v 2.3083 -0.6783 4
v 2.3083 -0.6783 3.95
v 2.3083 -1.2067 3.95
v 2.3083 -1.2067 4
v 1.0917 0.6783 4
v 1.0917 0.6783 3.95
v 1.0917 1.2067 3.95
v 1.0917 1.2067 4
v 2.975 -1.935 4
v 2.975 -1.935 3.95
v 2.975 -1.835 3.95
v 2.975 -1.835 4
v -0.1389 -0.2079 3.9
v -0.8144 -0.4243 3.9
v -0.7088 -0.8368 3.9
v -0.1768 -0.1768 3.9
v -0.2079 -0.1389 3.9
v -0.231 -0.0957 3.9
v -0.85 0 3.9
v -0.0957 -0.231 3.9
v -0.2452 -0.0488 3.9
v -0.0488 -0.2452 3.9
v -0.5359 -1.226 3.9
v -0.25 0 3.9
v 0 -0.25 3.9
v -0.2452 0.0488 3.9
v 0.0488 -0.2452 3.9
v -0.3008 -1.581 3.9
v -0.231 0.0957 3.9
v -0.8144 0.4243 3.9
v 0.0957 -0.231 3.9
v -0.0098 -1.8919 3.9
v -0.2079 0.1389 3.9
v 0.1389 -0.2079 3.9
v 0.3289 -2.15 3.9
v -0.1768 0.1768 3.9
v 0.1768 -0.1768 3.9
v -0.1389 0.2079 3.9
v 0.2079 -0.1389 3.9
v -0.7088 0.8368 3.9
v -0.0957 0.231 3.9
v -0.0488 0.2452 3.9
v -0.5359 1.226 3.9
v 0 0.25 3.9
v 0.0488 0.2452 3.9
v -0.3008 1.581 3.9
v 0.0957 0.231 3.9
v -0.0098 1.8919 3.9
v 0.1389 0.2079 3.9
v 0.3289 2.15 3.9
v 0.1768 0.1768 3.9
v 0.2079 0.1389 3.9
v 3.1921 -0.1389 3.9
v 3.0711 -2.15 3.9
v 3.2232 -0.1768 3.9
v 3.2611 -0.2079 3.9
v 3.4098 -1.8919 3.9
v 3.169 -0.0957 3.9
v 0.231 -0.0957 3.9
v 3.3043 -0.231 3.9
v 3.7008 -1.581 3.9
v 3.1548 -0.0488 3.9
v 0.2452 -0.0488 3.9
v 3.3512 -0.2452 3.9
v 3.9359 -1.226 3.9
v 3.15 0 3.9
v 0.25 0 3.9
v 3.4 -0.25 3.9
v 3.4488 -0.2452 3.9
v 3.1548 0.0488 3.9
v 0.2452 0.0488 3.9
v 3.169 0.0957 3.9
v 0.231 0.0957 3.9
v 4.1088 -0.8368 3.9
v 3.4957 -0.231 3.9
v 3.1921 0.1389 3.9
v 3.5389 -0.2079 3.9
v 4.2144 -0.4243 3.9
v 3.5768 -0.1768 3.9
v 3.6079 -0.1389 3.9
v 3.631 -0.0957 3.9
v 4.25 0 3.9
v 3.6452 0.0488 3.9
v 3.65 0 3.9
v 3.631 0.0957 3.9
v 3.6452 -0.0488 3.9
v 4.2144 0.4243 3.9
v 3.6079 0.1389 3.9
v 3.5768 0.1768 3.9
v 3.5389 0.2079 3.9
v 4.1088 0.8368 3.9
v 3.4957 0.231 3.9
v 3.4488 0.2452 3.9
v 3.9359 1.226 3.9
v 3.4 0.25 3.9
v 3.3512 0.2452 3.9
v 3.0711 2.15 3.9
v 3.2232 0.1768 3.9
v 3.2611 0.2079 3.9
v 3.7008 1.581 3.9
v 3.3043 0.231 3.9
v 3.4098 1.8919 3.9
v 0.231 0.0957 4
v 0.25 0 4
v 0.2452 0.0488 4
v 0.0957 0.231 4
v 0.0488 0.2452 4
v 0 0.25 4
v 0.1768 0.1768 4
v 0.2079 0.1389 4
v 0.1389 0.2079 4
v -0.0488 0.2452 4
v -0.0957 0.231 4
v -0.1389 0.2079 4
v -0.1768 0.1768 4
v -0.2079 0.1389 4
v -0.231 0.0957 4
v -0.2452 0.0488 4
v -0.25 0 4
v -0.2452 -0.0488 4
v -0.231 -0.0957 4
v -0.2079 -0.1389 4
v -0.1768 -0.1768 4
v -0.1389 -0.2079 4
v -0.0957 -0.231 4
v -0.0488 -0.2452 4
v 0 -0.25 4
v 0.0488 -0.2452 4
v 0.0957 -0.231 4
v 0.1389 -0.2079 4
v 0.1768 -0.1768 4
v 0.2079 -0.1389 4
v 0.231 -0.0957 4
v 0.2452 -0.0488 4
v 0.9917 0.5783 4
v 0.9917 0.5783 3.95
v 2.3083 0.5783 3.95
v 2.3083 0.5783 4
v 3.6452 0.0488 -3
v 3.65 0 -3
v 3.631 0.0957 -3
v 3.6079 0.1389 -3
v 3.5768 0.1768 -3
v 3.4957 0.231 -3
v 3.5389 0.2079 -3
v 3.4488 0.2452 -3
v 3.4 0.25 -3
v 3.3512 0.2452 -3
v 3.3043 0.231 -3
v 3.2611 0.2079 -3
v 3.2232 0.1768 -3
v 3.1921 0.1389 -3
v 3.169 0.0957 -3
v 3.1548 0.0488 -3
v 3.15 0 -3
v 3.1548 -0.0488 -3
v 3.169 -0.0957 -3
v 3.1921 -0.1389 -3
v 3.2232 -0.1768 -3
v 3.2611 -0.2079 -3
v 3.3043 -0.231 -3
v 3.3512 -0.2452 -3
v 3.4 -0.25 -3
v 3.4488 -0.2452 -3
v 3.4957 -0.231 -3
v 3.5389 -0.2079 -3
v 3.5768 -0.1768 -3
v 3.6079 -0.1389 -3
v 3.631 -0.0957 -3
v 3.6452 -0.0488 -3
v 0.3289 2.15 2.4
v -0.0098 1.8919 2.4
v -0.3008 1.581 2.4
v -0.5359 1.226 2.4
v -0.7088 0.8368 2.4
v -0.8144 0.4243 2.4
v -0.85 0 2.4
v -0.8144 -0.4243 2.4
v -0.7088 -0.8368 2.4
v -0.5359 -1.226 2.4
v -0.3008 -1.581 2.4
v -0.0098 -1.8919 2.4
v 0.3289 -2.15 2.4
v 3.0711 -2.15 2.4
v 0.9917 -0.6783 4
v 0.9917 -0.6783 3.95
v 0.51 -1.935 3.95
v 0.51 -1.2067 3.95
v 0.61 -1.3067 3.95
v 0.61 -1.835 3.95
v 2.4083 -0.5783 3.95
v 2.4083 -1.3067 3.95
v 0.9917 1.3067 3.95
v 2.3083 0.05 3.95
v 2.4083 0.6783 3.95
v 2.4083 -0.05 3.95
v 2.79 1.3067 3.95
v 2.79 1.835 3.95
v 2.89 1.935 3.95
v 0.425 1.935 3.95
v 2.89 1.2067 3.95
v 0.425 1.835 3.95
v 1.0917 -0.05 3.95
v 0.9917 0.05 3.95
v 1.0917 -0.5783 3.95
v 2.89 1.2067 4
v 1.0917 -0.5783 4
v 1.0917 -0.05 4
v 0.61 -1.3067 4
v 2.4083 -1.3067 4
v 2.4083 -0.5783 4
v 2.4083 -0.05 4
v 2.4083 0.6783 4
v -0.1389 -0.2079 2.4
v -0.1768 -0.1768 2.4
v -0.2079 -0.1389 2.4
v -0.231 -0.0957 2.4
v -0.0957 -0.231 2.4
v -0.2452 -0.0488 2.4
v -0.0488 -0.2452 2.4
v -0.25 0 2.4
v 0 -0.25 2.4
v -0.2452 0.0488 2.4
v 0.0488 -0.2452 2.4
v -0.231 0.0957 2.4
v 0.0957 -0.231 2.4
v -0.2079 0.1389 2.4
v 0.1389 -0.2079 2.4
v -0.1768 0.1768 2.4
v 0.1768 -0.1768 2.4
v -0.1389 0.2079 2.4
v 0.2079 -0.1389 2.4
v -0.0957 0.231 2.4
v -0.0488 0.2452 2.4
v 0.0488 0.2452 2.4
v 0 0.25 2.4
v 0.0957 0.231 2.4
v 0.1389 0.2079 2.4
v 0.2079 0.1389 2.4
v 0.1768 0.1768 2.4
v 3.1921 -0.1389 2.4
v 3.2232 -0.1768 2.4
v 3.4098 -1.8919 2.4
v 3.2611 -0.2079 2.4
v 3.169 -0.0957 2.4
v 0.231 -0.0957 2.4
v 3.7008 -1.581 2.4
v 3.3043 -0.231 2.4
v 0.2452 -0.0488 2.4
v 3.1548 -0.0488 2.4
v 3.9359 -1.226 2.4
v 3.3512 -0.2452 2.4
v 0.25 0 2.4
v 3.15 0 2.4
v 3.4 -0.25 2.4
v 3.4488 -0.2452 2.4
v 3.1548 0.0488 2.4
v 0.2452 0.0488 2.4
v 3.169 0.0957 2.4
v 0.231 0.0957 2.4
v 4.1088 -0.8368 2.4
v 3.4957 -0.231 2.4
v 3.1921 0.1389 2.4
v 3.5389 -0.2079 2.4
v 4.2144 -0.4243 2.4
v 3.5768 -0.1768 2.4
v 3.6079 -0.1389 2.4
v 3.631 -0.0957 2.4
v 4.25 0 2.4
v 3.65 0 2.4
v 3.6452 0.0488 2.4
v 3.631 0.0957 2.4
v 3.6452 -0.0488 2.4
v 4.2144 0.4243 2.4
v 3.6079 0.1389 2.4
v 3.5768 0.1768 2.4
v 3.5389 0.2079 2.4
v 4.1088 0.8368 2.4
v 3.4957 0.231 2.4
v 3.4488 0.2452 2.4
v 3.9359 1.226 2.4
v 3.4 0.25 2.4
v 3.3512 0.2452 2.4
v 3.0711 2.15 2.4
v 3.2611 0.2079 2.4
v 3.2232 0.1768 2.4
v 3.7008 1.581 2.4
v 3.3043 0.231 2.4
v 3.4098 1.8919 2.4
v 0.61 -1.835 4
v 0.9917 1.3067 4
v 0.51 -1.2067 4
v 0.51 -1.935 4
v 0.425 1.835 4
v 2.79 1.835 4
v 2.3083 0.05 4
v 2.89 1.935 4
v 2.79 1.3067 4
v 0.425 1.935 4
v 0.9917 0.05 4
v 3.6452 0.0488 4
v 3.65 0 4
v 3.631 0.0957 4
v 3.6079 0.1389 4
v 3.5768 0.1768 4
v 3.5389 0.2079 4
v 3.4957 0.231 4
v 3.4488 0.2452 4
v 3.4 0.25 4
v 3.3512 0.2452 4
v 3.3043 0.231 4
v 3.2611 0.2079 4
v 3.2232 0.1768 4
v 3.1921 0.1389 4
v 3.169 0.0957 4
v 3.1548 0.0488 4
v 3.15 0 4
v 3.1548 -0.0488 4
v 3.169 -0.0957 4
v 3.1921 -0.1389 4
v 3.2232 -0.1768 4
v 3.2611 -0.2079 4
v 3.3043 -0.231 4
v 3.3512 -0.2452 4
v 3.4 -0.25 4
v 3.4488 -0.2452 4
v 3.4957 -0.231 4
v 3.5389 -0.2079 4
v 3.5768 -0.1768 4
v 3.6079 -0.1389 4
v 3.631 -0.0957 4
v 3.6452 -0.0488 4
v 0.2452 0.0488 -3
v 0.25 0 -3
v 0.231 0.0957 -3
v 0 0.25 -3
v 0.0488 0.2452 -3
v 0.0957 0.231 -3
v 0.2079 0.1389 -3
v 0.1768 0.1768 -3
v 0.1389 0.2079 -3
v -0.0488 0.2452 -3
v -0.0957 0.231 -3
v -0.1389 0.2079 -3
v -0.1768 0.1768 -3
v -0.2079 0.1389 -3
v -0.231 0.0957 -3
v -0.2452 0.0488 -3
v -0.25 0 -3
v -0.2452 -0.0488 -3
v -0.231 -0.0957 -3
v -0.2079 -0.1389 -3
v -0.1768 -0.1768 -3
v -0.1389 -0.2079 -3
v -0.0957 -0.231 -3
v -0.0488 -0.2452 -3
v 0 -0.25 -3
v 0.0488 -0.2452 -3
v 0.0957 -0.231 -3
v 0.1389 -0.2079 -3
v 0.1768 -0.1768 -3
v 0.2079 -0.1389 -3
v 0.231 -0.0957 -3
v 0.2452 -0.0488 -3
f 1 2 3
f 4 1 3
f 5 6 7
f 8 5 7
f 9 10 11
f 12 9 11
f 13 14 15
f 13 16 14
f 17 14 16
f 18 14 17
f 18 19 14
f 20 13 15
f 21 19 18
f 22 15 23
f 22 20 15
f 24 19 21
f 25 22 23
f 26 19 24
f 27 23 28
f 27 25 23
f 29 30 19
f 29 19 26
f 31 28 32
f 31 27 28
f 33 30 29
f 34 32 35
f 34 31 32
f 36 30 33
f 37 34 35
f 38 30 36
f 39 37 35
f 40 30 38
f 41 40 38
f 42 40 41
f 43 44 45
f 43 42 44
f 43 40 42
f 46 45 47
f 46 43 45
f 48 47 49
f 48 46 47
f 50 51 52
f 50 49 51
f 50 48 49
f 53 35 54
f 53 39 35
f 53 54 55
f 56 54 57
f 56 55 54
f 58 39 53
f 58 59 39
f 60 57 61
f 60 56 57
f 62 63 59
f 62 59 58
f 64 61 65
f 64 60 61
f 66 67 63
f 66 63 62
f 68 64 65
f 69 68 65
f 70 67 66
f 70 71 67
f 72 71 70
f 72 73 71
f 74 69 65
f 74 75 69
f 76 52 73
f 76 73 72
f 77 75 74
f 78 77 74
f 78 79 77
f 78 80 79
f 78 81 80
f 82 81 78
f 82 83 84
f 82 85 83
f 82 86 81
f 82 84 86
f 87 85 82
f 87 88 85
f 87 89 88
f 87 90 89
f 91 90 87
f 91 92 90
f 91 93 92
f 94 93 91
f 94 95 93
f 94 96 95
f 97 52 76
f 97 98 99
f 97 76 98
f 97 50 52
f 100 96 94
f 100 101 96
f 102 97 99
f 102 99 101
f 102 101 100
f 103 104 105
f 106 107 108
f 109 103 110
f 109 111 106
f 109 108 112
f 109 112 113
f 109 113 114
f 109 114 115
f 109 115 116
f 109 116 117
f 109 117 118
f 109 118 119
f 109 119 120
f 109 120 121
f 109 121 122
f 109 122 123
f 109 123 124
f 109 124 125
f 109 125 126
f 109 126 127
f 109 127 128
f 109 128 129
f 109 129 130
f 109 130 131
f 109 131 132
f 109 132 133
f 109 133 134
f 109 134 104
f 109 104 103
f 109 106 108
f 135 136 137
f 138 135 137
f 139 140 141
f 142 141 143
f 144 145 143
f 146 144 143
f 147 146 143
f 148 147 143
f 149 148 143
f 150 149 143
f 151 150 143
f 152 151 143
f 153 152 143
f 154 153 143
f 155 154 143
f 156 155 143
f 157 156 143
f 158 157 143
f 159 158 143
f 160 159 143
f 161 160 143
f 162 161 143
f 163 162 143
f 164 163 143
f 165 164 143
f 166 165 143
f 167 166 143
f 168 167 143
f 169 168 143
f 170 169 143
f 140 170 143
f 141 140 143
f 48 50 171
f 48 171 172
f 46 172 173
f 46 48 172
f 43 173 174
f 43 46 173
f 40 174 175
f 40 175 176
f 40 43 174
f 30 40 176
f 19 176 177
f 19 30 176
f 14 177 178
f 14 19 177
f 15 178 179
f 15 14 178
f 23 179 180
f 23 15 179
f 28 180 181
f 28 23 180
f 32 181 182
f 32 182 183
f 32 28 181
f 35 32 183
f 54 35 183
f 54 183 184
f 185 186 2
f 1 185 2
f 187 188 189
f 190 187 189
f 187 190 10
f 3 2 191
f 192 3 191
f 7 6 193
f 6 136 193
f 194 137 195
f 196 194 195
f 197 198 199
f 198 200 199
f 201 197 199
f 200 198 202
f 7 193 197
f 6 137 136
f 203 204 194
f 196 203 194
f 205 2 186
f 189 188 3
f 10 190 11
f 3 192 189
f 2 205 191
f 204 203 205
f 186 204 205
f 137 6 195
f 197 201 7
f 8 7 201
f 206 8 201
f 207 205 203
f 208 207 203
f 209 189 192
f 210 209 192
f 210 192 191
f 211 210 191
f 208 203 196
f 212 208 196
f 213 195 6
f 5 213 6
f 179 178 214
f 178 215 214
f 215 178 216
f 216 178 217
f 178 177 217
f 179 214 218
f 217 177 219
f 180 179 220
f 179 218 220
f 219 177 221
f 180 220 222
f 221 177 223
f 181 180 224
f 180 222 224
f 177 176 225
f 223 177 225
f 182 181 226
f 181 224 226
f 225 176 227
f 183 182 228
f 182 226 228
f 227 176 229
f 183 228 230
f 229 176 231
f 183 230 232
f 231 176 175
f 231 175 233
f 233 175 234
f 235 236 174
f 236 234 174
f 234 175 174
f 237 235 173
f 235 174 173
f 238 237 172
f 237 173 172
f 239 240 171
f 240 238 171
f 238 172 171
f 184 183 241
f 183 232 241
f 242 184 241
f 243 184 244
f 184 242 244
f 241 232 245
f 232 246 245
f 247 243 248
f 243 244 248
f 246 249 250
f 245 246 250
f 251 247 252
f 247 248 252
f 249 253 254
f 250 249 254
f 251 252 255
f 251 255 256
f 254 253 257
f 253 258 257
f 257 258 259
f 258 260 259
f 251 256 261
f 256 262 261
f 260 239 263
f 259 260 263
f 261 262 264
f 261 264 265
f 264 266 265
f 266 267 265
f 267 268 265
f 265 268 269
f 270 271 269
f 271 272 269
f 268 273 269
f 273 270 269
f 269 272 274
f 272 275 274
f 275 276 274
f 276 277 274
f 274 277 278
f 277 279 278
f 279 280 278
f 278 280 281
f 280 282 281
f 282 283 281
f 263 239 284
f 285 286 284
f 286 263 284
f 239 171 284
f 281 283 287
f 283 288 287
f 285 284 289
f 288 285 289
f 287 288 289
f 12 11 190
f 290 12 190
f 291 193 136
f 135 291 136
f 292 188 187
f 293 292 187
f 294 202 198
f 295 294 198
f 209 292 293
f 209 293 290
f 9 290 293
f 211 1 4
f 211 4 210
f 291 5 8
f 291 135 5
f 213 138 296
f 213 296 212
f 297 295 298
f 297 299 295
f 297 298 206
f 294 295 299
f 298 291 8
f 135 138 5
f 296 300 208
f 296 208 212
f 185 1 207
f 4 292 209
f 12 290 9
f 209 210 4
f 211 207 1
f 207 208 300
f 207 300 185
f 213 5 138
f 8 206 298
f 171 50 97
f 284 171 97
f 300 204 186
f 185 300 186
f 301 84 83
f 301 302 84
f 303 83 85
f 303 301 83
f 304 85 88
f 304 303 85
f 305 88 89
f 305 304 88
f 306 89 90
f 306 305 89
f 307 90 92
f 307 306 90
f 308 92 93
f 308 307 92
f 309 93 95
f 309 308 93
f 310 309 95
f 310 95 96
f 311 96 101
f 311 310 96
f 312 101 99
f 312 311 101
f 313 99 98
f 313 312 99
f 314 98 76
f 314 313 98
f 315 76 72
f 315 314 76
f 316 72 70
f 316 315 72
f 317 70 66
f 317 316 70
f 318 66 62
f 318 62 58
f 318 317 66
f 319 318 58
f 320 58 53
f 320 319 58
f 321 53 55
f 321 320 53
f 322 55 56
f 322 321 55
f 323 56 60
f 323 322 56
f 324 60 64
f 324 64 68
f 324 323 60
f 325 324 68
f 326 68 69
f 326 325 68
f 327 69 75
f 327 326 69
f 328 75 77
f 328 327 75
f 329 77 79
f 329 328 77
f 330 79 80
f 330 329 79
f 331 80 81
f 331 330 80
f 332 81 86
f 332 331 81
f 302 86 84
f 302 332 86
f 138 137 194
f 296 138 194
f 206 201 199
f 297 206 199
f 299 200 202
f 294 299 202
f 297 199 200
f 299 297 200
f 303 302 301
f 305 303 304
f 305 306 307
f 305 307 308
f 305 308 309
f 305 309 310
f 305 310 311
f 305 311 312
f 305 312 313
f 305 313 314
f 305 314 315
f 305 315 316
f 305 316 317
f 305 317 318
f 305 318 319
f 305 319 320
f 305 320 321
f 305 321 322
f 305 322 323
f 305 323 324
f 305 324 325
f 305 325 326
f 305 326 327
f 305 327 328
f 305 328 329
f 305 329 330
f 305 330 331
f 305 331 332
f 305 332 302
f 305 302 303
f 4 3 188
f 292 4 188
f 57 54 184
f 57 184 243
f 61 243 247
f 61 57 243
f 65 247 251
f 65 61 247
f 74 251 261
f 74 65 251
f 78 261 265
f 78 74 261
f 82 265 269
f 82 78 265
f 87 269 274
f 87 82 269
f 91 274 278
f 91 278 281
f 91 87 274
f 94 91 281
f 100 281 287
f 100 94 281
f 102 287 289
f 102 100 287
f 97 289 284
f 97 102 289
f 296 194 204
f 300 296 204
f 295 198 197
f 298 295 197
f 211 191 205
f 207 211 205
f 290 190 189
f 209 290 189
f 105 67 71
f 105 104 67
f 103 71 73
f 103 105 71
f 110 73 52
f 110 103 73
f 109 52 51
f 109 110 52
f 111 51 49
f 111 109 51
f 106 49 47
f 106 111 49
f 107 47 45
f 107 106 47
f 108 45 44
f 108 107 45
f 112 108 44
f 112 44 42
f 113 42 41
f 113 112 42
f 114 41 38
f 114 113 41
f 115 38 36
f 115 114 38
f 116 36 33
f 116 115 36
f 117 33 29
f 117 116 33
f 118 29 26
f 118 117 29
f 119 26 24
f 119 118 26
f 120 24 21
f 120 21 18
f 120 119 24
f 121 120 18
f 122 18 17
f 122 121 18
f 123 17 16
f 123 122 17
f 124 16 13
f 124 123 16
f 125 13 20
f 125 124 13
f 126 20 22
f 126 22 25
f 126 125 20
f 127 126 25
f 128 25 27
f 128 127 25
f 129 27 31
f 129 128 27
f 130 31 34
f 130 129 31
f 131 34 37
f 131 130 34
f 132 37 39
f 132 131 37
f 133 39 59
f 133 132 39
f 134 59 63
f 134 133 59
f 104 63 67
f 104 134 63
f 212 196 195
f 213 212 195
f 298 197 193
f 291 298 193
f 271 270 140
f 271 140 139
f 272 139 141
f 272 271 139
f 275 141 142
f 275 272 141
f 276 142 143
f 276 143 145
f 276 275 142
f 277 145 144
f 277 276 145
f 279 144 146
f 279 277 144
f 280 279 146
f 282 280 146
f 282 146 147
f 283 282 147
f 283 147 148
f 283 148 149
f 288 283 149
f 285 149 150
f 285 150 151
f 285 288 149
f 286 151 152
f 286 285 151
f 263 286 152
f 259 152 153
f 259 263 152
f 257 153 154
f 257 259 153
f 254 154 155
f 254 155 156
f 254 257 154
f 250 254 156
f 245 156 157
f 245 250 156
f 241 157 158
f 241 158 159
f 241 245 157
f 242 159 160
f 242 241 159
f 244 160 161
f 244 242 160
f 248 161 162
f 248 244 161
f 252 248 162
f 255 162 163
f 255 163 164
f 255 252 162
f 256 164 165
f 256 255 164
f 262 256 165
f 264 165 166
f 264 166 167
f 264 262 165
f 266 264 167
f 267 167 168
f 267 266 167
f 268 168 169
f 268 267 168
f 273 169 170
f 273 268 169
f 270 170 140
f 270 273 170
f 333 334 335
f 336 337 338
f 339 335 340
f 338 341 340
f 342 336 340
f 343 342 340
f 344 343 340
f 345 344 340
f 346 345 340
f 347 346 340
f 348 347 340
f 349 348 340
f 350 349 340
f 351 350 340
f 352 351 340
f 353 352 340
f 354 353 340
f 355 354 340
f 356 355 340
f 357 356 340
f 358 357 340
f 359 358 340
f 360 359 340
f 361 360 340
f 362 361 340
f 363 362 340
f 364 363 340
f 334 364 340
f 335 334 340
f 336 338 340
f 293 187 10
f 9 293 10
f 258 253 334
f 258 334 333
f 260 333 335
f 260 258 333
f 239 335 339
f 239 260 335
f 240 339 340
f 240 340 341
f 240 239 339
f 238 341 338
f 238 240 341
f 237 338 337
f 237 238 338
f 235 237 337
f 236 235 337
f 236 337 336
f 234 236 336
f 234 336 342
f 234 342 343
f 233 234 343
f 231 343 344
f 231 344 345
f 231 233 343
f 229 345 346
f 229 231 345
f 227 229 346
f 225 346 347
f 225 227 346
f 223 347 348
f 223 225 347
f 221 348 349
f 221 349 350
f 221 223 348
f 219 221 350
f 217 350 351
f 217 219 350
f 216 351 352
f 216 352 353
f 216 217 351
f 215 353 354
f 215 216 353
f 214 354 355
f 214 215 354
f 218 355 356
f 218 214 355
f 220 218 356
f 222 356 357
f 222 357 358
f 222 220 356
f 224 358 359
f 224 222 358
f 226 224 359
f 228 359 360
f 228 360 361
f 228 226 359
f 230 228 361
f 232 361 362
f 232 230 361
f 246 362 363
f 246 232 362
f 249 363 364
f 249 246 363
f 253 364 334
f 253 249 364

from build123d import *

# Parameters (mm, degrees)
PAD001_DEPTH   = 1.5
SKETCH_R       = 0.25
PAD_DEPTH      = 4
PAD_DEPTH_BACK = 3
PAD002_DEPTH   = 0.05


with BuildPart() as pad001:
    # Sketch001 → Pad001 (new body)
    with BuildSketch(Plane.XY.offset(3.9)):
        with BuildLine():
            ThreePointArc((0.328869, 2.15), (-0.85, 0), (0.328869, -2.15))
            Line((0.328869, -2.15), (3.071131, -2.15))
            ThreePointArc((3.071131, -2.15), (4.25, 0), (3.071131, 2.15))
            Line((0.328869, 2.15), (3.071131, 2.15))
        make_face()
    extrude(amount=-PAD001_DEPTH)


with BuildPart() as pad:
    # Sketch → Pad (new body, two sides)
    with BuildSketch(Plane.XY) as pad_sk:
        Circle(SKETCH_R)
        with Locations((3.4, 0)):
            Circle(SKETCH_R)
    extrude(amount=PAD_DEPTH)
    extrude(pad_sk.sketch, amount=-PAD_DEPTH_BACK)


with BuildPart() as r_ldr_5_1x4_3mm_p3_4mm_vertical:
    # Sketch002 → Pad002 (new body)
    with BuildSketch(Plane.XY.offset(3.95)):
        Polygon((0.425, 1.835), (2.79, 1.835), (2.79, 1.306667), (0.991667, 1.306667), (0.991667, 1.206667), (0.991667, 0.578333), (1.091667, 0.578333), (2.308333, 0.578333), (2.308333, 0.05), (0.991667, 0.05), (0.991667, -0.05), (0.991667, -0.678333), (1.091667, -0.678333), (2.308333, -0.678333), (2.308333, -1.206667), (0.51, -1.206667), (0.51, -1.306667), (0.51, -1.935), (0.61, -1.935), (2.975, -1.935), (2.975, -1.835), (0.61, -1.835), (0.61, -1.306667), (2.308333, -1.306667), (2.408333, -1.306667), (2.408333, -0.678333), (2.408333, -0.578333), (1.091667, -0.578333), (1.091667, -0.05), (2.308333, -0.05), (2.408333, -0.05), (2.408333, 0.578333), (2.408333, 0.678333), (1.091667, 0.678333), (1.091667, 1.206667), (2.79, 1.206667), (2.89, 1.206667), (2.89, 1.835), (2.89, 1.935), (0.425, 1.935), align=None)
    extrude(amount=PAD002_DEPTH)

    # Pad002_mp_cp: union Pad001, Pad
    add(pad001.part)
    add(pad.part)


solid = r_ldr_5_1x4_3mm_p3_4mm_vertical.part
